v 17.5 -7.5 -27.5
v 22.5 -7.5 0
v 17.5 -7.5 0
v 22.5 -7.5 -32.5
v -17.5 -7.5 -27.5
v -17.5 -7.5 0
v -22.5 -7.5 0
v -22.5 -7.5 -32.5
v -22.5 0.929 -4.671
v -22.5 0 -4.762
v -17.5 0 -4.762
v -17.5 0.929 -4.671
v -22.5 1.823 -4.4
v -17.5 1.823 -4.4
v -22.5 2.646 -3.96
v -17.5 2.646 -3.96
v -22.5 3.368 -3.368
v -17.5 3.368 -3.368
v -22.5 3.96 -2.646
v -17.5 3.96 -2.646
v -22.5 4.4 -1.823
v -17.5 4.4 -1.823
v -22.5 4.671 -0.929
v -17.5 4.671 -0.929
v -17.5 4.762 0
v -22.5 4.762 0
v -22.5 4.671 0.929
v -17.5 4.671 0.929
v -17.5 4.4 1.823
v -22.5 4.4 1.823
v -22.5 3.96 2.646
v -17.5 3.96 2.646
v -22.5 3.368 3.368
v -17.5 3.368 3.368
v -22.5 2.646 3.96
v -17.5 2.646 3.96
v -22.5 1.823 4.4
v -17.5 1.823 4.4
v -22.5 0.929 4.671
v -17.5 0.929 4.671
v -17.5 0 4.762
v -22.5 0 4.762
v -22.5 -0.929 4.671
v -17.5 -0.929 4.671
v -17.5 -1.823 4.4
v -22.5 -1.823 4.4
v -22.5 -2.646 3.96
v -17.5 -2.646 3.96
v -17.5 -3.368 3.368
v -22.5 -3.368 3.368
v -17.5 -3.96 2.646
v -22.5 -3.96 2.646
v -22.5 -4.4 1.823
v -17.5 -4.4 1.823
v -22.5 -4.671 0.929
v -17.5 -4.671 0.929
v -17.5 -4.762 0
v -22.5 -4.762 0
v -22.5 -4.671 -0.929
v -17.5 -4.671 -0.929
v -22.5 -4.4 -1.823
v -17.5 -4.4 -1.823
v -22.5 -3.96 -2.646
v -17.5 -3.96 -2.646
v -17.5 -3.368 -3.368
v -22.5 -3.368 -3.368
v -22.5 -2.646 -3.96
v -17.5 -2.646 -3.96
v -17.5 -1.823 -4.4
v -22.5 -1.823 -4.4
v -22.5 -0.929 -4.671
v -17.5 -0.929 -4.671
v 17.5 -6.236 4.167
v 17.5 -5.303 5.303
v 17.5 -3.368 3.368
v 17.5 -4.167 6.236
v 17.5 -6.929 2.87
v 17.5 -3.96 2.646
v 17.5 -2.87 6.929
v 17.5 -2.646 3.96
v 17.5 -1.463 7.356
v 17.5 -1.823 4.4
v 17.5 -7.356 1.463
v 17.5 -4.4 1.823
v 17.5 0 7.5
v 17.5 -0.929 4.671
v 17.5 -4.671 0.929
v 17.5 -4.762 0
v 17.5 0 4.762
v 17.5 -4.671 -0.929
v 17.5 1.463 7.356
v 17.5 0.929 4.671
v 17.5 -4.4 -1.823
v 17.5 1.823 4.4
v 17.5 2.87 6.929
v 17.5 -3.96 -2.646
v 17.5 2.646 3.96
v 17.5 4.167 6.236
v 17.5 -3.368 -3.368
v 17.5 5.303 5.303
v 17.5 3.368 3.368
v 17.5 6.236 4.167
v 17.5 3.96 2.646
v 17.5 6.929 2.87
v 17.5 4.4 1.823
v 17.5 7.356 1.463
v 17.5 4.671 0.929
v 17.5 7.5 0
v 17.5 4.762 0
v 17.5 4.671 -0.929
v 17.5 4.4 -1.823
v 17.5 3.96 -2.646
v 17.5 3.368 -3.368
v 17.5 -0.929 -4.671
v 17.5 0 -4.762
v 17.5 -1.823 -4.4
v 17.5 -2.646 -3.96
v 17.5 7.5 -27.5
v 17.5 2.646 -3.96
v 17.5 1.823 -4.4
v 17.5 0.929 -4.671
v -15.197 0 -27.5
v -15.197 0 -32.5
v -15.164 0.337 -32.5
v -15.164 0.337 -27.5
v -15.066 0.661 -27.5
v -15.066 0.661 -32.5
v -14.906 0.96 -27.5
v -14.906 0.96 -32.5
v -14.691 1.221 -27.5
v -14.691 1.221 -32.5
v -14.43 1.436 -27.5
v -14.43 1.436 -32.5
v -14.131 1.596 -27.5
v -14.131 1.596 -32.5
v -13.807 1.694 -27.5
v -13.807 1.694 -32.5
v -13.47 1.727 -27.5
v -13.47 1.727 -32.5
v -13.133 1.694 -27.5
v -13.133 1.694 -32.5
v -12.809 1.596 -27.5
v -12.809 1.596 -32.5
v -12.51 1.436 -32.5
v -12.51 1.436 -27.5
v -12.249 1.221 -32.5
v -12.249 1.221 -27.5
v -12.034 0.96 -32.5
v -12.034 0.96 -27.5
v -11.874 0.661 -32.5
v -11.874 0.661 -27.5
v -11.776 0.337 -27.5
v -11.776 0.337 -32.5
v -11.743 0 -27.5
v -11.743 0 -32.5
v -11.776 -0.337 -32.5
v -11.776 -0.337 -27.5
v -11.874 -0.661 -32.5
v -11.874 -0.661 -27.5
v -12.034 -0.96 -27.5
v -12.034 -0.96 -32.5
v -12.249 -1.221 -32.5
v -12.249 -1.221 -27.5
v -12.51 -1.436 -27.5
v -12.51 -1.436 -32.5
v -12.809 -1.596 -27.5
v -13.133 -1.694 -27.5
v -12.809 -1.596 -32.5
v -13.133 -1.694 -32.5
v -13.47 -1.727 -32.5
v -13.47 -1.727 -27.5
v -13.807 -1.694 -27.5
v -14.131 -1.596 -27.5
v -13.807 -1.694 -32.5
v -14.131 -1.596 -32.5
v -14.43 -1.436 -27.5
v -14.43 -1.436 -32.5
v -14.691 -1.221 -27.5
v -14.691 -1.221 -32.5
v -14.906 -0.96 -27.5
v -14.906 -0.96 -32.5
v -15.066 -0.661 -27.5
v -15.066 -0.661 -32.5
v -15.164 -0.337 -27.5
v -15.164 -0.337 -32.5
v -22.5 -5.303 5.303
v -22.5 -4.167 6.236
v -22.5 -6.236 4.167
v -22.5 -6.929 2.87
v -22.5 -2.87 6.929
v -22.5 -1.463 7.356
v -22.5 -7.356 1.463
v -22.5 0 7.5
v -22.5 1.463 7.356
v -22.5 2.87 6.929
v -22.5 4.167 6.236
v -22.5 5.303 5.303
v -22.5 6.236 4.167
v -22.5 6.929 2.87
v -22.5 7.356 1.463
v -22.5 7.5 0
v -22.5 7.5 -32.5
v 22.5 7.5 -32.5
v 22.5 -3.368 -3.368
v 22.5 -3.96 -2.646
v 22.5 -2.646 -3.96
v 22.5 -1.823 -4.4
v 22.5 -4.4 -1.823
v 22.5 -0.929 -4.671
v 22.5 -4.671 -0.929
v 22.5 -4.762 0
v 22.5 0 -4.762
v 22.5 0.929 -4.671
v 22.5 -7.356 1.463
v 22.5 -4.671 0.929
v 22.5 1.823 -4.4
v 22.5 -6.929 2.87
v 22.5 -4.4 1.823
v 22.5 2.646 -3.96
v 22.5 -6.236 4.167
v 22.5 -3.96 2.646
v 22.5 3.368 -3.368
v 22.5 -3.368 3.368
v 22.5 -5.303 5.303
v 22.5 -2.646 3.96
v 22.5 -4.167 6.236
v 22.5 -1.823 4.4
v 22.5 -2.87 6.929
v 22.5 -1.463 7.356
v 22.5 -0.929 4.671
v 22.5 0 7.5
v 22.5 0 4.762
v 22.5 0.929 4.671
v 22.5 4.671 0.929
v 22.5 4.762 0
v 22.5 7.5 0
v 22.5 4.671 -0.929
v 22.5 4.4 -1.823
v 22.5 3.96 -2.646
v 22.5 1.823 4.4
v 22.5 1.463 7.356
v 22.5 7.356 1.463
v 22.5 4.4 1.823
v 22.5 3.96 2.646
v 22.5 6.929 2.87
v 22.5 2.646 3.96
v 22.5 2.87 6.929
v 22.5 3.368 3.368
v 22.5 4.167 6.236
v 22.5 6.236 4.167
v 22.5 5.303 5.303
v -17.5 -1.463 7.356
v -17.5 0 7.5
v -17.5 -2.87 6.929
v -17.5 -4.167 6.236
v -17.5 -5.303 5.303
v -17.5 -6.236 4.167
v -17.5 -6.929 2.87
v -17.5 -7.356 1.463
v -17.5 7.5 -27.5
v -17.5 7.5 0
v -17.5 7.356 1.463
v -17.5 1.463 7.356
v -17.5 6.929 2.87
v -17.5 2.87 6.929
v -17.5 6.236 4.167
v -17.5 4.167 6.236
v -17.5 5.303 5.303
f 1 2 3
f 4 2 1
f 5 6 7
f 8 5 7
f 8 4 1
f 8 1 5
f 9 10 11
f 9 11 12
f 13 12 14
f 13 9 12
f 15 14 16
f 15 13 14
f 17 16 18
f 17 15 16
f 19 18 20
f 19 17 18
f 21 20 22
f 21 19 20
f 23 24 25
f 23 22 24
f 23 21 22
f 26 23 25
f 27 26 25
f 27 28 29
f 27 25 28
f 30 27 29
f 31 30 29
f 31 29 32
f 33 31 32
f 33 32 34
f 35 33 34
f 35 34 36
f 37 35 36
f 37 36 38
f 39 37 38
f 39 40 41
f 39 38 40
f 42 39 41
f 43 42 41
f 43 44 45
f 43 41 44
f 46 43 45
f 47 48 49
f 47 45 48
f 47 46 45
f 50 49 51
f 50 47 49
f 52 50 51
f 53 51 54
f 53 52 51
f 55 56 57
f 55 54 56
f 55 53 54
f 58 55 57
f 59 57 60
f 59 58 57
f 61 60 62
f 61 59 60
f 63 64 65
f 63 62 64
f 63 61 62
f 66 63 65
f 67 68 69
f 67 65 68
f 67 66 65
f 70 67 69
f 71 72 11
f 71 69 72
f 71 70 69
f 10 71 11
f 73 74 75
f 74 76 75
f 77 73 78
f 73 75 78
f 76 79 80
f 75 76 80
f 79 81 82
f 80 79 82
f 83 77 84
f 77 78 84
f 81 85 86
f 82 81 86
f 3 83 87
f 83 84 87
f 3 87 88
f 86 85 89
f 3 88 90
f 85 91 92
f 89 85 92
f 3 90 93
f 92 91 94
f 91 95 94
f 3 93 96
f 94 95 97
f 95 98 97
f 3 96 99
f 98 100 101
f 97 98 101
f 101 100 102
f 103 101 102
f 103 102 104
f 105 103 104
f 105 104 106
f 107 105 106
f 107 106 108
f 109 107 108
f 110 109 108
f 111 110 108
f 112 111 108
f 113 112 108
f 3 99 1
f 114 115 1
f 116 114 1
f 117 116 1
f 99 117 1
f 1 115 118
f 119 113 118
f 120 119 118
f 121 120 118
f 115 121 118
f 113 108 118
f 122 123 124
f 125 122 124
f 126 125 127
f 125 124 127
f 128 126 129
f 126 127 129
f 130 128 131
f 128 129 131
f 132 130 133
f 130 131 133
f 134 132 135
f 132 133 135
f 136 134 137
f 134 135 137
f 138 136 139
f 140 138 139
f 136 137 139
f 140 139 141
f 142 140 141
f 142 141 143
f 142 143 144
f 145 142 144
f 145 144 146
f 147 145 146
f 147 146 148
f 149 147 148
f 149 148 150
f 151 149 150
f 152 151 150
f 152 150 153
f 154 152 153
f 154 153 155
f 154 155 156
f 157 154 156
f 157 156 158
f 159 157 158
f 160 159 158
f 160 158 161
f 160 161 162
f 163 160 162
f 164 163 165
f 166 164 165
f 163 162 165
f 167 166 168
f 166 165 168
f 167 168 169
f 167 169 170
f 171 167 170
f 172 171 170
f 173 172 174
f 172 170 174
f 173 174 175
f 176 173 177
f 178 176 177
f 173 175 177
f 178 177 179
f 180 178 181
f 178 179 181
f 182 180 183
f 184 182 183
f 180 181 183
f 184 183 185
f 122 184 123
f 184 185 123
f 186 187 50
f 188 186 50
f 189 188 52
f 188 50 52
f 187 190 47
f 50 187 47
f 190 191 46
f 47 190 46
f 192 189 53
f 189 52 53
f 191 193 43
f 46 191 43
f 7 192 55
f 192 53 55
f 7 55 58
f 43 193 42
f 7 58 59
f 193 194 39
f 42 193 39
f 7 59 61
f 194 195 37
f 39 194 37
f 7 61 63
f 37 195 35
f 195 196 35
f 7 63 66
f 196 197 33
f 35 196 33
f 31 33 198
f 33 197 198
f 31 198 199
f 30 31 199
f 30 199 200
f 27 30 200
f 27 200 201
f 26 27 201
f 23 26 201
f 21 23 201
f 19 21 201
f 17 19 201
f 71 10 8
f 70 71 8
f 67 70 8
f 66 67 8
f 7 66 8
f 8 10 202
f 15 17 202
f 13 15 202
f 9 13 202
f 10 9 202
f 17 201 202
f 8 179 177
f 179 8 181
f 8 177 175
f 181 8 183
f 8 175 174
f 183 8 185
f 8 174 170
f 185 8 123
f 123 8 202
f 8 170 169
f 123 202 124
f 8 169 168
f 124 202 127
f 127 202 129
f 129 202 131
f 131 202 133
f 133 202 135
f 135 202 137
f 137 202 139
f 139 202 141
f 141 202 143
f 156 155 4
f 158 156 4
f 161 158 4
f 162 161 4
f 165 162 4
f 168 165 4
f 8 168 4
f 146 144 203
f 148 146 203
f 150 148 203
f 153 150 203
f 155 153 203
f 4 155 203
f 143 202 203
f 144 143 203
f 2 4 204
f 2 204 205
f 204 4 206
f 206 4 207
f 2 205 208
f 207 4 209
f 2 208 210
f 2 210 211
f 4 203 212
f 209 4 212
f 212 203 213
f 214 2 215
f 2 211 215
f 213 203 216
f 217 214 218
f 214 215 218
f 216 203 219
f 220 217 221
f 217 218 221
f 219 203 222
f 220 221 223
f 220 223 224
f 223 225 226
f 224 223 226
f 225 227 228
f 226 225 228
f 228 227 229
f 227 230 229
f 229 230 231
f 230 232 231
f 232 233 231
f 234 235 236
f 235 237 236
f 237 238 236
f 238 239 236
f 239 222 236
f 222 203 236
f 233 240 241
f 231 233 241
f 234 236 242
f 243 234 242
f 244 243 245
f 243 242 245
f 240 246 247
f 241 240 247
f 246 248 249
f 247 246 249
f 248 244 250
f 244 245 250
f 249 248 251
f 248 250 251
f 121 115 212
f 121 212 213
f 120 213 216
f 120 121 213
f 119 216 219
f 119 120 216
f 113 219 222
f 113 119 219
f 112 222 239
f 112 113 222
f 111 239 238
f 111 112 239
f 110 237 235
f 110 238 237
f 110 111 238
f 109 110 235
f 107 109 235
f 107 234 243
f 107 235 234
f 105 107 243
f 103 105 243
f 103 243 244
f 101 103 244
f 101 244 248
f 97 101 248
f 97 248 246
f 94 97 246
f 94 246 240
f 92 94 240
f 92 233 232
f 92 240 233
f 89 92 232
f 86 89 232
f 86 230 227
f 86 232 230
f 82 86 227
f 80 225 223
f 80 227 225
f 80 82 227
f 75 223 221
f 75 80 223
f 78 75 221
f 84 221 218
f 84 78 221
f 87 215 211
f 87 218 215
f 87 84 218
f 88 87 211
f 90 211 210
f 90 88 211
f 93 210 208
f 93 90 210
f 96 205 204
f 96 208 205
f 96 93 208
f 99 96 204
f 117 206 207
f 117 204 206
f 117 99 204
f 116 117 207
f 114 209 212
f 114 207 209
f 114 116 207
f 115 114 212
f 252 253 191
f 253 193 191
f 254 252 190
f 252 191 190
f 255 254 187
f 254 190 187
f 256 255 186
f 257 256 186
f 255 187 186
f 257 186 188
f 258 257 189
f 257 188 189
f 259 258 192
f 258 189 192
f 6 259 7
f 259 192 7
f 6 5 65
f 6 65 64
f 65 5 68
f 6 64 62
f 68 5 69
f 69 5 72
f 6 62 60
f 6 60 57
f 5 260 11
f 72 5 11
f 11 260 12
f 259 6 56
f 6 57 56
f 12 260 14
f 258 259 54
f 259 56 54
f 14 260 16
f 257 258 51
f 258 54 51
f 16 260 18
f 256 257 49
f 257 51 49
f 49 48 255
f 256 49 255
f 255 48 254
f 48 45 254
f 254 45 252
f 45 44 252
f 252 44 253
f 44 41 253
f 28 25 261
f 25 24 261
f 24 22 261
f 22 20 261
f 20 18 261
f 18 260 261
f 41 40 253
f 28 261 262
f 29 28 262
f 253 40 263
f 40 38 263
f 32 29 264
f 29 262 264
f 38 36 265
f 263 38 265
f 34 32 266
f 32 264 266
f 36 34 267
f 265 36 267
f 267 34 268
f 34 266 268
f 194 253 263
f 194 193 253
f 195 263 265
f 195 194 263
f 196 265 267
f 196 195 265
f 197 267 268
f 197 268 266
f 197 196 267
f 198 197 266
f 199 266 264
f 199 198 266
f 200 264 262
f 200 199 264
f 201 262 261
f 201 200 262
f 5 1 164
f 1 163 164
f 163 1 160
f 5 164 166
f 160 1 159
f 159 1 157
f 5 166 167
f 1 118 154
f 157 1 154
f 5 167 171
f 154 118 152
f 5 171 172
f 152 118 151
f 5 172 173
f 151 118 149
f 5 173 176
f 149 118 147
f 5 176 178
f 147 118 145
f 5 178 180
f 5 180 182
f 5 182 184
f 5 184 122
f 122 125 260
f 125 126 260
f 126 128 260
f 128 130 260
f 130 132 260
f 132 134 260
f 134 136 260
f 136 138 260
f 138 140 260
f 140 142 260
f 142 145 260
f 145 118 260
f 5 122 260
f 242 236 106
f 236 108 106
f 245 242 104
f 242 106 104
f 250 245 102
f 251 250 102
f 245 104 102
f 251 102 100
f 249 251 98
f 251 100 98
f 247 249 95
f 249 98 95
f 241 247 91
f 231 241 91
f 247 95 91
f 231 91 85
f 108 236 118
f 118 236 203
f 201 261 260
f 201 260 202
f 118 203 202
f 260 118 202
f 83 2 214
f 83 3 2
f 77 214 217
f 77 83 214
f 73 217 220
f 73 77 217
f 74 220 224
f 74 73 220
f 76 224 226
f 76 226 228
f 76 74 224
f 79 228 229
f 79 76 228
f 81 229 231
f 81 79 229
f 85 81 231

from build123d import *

# Parameters (mm, degrees)
BOSS_EXTRUDE1_DEPTH     = 7.5
CUT_EXTRUDE1_DEPTH      = 41.233692349
CUT_EXTRUDE1_DEPTH_BACK = 41.233692349
SKETCH3_R               = 4.7625
FILLET1_R               = 7.5
F_8_32_TAPPED_HOLE1_D   = 3.4544


with BuildPart() as part:
    # Sketch1 → Boss-Extrude1 (new, symmetric)
    with BuildSketch(Plane(origin=(0, 0, 0), x_dir=(1, 0, 0), z_dir=(0, 1, 0))):
        Polygon((-17.5, -7.5), (-22.5, -7.5), (-22.5, 32.5), (22.5, 32.5), (22.5, -7.5), (17.5, -7.5), (17.5, 27.5), (-17.5, 27.5), align=None)
    extrude(amount=BOSS_EXTRUDE1_DEPTH, both=True)

    # Sketch3 → Cut-Extrude1 (cut, two sides: drawn at the far end of the back side and taken through both)
    with BuildSketch(Plane(origin=(0, 0, 0), x_dir=(0, 0, -1), z_dir=(1, 0, 0)).offset(-CUT_EXTRUDE1_DEPTH_BACK)):
        Circle(SKETCH3_R)
    extrude(amount=CUT_EXTRUDE1_DEPTH + CUT_EXTRUDE1_DEPTH_BACK, mode=Mode.SUBTRACT)

    # Fillet1
    fillet1_edges = [part.edges().sort_by_distance(p)[0] for p in [
        (20, 7.5, 7.5),
        (20, -7.5, 7.5),
        (-20, -7.5, 7.5),
        (-20, 7.5, 7.5),
    ]]
    fillet(fillet1_edges, radius=FILLET1_R - 0.0001)  # a hair under: the kernel refuses the full size

    # #8-32 Tapped Hole1 (through all)
    with Locations(Plane.XY.offset(-27.5)):
        with Locations((-13.47, 0)):
            Hole(F_8_32_TAPPED_HOLE1_D / 2)


solid = part.part
